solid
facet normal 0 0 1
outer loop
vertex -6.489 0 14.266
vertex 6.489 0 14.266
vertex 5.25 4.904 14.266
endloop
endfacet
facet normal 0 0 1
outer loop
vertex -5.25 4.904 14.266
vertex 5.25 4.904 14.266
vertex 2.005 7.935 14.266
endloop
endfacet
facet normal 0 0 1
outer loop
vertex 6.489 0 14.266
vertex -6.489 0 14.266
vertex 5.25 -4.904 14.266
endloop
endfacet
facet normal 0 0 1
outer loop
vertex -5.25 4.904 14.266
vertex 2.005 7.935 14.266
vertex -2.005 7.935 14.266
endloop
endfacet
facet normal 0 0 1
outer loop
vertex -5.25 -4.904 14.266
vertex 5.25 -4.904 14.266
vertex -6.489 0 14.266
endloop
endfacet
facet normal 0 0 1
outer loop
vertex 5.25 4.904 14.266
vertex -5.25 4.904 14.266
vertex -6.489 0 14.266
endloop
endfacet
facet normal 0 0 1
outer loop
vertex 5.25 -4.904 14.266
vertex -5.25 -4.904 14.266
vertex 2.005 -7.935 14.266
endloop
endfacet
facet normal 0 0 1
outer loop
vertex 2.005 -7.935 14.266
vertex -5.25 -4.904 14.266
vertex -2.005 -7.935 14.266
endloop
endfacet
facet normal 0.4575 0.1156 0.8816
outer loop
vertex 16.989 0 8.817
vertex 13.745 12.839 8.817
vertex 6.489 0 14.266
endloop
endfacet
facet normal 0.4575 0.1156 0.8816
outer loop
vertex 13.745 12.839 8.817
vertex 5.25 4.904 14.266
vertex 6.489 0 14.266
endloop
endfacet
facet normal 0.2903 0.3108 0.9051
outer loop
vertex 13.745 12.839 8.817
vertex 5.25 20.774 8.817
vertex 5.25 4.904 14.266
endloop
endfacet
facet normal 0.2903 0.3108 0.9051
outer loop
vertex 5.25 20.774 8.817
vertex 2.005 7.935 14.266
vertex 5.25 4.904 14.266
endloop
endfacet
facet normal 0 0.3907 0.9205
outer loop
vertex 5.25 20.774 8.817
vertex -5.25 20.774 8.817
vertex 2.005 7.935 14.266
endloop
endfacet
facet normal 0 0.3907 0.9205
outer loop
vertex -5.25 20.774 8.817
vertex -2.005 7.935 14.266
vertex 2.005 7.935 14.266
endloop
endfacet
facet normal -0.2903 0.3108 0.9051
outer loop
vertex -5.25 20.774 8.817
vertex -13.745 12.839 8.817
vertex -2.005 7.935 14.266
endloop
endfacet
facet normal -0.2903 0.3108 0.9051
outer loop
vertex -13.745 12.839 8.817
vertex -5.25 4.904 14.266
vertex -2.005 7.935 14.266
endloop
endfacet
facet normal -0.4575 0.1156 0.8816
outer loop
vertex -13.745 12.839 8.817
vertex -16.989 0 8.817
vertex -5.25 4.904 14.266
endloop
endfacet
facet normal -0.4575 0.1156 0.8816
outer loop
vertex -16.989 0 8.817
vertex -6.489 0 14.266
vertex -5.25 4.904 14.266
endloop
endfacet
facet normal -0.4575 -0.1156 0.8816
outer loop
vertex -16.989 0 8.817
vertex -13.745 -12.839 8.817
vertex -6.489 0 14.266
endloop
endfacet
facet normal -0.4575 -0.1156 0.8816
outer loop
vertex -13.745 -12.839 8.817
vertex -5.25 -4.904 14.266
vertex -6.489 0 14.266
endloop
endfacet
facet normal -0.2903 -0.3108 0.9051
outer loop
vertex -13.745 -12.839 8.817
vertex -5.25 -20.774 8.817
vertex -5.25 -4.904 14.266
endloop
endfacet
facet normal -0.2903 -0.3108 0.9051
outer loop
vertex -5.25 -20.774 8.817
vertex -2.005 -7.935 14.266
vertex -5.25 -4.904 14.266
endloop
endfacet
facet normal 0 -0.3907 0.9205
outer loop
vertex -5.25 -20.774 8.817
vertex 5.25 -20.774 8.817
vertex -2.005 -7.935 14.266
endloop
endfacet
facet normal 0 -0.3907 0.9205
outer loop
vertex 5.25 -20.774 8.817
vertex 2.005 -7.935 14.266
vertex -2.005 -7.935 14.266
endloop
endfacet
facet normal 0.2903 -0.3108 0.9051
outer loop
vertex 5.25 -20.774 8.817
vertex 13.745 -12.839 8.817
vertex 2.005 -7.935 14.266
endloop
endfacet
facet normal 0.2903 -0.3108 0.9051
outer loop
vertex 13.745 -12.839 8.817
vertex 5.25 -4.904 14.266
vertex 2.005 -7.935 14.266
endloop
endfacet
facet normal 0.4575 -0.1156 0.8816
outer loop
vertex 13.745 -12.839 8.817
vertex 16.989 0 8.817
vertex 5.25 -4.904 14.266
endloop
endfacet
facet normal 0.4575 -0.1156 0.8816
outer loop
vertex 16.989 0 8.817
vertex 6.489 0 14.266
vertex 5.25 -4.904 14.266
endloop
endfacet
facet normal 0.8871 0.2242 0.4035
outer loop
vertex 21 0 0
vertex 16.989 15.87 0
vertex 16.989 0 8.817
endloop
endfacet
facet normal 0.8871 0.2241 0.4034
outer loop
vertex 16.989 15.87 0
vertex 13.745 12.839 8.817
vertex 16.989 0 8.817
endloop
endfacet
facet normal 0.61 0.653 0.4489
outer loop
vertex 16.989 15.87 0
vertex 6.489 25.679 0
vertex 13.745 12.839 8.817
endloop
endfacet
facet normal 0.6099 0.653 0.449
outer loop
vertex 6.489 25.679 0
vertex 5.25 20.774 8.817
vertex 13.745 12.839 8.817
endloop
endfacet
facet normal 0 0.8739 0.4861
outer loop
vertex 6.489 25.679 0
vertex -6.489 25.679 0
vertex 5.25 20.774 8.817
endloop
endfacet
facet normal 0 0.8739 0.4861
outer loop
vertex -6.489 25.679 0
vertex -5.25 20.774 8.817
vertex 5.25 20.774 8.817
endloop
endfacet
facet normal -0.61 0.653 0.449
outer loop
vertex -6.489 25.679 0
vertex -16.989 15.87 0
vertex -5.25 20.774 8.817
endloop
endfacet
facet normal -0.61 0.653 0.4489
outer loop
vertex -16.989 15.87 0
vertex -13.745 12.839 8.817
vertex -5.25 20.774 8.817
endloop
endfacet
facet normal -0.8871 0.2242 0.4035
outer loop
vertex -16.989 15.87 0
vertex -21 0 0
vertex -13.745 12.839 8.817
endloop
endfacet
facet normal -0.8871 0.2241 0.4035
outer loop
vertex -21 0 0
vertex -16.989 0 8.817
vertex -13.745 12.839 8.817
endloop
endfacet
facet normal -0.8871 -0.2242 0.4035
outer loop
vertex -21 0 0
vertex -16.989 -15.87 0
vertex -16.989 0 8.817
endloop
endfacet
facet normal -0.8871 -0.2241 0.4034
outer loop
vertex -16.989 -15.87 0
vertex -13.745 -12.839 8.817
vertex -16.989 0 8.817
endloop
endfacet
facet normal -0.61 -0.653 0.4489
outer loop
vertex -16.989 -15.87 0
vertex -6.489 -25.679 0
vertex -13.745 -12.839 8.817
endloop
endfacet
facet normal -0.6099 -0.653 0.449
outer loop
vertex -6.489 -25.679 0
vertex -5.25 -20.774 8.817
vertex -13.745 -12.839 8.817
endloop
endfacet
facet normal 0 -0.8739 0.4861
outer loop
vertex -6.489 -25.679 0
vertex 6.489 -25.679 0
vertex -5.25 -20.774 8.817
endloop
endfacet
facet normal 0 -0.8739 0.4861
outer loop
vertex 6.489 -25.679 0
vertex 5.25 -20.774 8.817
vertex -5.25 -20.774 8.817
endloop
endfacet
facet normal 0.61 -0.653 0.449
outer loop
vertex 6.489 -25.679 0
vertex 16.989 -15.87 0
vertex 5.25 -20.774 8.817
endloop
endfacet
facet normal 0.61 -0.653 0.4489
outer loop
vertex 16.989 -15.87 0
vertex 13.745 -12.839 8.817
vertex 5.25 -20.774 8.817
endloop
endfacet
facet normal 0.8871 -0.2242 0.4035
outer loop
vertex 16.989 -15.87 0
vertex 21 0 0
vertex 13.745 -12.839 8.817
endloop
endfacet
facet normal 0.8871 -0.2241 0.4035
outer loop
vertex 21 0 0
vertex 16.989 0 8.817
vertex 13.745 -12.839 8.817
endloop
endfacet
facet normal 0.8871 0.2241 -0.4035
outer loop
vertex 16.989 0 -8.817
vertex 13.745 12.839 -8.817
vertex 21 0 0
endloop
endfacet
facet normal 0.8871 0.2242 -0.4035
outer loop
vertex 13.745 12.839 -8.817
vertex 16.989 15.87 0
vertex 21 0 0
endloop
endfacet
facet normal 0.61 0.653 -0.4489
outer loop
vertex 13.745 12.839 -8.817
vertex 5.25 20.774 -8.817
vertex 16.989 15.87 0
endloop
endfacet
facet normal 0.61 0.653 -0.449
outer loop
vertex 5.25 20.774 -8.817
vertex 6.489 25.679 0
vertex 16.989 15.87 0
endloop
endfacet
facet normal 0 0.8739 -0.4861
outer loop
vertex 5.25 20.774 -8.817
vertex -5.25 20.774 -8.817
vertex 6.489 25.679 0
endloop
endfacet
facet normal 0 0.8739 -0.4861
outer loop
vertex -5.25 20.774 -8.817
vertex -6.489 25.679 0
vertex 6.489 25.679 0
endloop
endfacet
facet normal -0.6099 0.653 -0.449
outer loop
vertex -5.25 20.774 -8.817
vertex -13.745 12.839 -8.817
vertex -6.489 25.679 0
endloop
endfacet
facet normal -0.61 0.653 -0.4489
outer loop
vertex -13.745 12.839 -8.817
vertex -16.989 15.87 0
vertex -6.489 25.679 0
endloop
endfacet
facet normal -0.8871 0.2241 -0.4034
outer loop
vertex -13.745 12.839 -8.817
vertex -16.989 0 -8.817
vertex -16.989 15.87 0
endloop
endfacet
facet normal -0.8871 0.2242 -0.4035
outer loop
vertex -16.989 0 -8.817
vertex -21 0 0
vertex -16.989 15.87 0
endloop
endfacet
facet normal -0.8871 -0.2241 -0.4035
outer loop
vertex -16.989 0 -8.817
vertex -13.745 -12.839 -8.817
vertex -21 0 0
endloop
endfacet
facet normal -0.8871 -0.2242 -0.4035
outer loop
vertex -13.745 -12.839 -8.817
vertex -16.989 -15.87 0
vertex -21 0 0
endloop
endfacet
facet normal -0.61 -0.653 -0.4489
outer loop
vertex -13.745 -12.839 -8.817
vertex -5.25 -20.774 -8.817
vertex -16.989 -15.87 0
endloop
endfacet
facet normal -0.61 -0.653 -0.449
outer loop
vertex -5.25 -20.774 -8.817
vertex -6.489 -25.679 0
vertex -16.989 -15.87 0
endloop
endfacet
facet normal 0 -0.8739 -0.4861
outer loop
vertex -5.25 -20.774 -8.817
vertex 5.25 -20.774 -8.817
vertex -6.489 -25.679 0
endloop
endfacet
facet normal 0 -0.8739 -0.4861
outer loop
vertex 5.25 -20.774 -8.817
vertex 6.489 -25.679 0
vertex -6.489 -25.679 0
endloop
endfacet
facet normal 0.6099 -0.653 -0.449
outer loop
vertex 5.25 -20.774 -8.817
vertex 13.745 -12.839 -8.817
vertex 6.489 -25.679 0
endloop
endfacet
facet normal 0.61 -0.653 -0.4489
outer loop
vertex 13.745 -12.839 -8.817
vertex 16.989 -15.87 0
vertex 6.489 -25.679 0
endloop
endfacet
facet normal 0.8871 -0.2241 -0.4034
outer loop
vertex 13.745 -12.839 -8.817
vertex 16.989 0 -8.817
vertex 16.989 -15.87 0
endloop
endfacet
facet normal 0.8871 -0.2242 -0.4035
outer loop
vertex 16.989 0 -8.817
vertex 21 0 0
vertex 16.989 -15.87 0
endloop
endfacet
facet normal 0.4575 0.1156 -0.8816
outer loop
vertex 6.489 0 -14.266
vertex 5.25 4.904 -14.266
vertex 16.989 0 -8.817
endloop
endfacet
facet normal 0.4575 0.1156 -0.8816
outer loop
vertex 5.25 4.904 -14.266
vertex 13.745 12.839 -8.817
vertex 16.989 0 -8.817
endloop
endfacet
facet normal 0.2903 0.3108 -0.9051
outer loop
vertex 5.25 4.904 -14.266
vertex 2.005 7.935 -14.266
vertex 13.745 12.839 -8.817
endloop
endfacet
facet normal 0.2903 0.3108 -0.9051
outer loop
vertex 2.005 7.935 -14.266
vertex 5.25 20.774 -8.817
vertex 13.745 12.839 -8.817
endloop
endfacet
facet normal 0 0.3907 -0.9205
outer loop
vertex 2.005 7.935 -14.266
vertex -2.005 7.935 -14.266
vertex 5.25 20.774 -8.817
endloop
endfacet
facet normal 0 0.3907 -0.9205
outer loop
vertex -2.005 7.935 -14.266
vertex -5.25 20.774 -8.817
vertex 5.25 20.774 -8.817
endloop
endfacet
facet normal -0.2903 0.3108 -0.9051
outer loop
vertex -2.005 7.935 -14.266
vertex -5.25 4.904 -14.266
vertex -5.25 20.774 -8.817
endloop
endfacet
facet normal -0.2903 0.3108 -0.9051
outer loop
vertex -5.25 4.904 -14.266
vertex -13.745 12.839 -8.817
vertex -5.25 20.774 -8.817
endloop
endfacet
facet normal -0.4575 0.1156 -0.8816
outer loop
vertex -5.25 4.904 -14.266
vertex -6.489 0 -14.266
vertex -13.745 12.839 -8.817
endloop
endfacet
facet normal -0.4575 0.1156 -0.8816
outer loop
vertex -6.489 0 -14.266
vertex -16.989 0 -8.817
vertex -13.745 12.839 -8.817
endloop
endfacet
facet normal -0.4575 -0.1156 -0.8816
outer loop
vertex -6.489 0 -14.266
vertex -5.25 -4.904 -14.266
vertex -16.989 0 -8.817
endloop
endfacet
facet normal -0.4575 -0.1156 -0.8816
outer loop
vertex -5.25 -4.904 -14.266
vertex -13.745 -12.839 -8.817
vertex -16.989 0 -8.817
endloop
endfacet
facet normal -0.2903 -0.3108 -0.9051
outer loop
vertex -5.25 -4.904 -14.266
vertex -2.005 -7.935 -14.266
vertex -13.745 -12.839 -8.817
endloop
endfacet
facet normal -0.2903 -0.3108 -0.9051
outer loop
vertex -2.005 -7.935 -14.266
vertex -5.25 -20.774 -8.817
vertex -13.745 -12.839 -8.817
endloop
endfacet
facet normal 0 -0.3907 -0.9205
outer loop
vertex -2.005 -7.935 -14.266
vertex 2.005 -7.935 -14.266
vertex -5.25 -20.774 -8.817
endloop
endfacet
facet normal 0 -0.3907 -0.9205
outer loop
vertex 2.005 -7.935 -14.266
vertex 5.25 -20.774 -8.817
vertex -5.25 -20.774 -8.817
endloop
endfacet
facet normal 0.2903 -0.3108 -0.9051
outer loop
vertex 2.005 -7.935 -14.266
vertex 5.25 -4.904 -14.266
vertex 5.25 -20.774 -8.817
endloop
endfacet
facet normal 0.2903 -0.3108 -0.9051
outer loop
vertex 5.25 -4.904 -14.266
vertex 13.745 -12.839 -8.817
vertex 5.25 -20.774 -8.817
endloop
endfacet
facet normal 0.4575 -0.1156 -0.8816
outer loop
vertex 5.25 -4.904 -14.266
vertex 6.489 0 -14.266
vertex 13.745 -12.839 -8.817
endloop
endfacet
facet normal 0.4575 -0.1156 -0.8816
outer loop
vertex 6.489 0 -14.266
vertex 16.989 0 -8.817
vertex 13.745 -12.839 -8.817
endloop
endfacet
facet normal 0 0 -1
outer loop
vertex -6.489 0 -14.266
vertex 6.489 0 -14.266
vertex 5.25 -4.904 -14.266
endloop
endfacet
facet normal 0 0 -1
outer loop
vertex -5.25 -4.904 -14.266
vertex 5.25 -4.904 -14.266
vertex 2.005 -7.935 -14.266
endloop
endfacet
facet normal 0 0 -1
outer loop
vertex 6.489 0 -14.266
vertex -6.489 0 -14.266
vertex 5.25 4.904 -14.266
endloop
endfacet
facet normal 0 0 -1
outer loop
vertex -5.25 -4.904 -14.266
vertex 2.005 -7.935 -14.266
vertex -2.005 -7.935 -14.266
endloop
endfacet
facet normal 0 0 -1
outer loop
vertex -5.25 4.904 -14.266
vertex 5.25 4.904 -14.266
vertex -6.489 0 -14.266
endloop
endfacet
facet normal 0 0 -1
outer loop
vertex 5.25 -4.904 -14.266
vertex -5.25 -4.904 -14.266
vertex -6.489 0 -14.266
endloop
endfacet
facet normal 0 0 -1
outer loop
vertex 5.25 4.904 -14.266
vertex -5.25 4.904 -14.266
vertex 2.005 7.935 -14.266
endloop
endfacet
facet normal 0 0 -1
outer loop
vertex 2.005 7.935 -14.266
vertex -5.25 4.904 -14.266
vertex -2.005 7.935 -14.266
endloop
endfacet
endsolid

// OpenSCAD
// Generated by SolidPython 1.0.1 on 2020-07-29 00:46:47


scale(v = [7, 9, 5]) {
	sphere(r = 3);
}
/***********************************************
*********      SolidPython code:      **********
************************************************
 
# import packages: SolidPython
from solid import *
from solid.utils import *
from itertools import chain, combinations, permutations


class Resize:

    def __init__(self, scad_file):
        self.scad_file = scad_file
        #self.scad_file = import_scad(scad_file)
        # cone/cylinder param:
        self.r1 = 0
        self.r2 = 0
        self.h = 0
        # rectangular prism param:
        self.w = 0
        self.l = 0
        # ellipse param:
        self.r = 0

    # import OpenScad code (file name corresponds to shape)


    # classify shape + parameters
    def assign(self, param1, param2, param3):
        if self.scad_file == 'cone.scad':
            self.r1 = param1
            self.r2 = param2
            self.h = param3
        elif self.scad_file == 'cylinder.scad':
            self.r1 = param1
            self.r2 = param2
            self.h = param3
        elif self.scad_file == 'rectangularPrism.scad':
            self.h = param1
            self.l = param2
            self.w = param3
        else:
            self.r = param1
            self.h = param2

    # resize parameters
    def iterate(self):
        x = range(3, 20, 2)
        i = 1
        if self.scad_file == 'cone.scad':
            tempList = list(permutations(x, 2))
            for temp in tempList:
                param1 = temp[0]
                param2 = temp[1]
                filepath = 'produced_scad_files/' + 'cone' + str(param1) + '_' + str(param2) + '_' + '.scad'
                scad_render_to_file(cylinder(h=param1, r1=param2, r2=0), filepath)

        elif self.scad_file == 'cylinder.scad':
            tempList = list(permutations(x, 3))
            for temp in tempList:
                param1 = temp[0]
                param2 = temp[1]
                filepath = 'produced_scad_files/' + 'cylinder' + str(param1) + '_' + str(param2) + '_' + '.scad'
                scad_render_to_file(cylinder(h=param1, r1=param2, r2=param2), filepath)

        elif self.scad_file == 'rectangularPrism.scad':
            tempList = list(permutations(x, 3))
            for temp in tempList:
                param1 = temp[0]
                param2 = temp[1]
                param3 = temp[2]
                filepath = 'produced_scad_files/' + 'rectangularPrism' + str(param1) + '_' + str(param2) + '_' + str(
                    param3) + '.scad'
                scad_render_to_file(cube(size=(param1, param2, param3)), filepath)

        elif self.scad_file == 'ellipse.scad':
            tempList = list(permutations(x, 4))
            for temp in tempList:
                param1 = temp[0]
                param2 = temp[1]
                param3 = temp[2]
                param4 = temp[3]
                filepath = 'produced_scad_files/' + 'ellipse' + str(param1) + '_' + str(param2) + '_' + str(param3) + '_' + str(param4) + '.scad'
                scad_render_to_file(scale([param1, param2, param3])(sphere(r=param4)), filepath)

    def render_to_scadfile(self):
        scad_render_to_file(scad, 'example.scad') 
 
************************************************/
